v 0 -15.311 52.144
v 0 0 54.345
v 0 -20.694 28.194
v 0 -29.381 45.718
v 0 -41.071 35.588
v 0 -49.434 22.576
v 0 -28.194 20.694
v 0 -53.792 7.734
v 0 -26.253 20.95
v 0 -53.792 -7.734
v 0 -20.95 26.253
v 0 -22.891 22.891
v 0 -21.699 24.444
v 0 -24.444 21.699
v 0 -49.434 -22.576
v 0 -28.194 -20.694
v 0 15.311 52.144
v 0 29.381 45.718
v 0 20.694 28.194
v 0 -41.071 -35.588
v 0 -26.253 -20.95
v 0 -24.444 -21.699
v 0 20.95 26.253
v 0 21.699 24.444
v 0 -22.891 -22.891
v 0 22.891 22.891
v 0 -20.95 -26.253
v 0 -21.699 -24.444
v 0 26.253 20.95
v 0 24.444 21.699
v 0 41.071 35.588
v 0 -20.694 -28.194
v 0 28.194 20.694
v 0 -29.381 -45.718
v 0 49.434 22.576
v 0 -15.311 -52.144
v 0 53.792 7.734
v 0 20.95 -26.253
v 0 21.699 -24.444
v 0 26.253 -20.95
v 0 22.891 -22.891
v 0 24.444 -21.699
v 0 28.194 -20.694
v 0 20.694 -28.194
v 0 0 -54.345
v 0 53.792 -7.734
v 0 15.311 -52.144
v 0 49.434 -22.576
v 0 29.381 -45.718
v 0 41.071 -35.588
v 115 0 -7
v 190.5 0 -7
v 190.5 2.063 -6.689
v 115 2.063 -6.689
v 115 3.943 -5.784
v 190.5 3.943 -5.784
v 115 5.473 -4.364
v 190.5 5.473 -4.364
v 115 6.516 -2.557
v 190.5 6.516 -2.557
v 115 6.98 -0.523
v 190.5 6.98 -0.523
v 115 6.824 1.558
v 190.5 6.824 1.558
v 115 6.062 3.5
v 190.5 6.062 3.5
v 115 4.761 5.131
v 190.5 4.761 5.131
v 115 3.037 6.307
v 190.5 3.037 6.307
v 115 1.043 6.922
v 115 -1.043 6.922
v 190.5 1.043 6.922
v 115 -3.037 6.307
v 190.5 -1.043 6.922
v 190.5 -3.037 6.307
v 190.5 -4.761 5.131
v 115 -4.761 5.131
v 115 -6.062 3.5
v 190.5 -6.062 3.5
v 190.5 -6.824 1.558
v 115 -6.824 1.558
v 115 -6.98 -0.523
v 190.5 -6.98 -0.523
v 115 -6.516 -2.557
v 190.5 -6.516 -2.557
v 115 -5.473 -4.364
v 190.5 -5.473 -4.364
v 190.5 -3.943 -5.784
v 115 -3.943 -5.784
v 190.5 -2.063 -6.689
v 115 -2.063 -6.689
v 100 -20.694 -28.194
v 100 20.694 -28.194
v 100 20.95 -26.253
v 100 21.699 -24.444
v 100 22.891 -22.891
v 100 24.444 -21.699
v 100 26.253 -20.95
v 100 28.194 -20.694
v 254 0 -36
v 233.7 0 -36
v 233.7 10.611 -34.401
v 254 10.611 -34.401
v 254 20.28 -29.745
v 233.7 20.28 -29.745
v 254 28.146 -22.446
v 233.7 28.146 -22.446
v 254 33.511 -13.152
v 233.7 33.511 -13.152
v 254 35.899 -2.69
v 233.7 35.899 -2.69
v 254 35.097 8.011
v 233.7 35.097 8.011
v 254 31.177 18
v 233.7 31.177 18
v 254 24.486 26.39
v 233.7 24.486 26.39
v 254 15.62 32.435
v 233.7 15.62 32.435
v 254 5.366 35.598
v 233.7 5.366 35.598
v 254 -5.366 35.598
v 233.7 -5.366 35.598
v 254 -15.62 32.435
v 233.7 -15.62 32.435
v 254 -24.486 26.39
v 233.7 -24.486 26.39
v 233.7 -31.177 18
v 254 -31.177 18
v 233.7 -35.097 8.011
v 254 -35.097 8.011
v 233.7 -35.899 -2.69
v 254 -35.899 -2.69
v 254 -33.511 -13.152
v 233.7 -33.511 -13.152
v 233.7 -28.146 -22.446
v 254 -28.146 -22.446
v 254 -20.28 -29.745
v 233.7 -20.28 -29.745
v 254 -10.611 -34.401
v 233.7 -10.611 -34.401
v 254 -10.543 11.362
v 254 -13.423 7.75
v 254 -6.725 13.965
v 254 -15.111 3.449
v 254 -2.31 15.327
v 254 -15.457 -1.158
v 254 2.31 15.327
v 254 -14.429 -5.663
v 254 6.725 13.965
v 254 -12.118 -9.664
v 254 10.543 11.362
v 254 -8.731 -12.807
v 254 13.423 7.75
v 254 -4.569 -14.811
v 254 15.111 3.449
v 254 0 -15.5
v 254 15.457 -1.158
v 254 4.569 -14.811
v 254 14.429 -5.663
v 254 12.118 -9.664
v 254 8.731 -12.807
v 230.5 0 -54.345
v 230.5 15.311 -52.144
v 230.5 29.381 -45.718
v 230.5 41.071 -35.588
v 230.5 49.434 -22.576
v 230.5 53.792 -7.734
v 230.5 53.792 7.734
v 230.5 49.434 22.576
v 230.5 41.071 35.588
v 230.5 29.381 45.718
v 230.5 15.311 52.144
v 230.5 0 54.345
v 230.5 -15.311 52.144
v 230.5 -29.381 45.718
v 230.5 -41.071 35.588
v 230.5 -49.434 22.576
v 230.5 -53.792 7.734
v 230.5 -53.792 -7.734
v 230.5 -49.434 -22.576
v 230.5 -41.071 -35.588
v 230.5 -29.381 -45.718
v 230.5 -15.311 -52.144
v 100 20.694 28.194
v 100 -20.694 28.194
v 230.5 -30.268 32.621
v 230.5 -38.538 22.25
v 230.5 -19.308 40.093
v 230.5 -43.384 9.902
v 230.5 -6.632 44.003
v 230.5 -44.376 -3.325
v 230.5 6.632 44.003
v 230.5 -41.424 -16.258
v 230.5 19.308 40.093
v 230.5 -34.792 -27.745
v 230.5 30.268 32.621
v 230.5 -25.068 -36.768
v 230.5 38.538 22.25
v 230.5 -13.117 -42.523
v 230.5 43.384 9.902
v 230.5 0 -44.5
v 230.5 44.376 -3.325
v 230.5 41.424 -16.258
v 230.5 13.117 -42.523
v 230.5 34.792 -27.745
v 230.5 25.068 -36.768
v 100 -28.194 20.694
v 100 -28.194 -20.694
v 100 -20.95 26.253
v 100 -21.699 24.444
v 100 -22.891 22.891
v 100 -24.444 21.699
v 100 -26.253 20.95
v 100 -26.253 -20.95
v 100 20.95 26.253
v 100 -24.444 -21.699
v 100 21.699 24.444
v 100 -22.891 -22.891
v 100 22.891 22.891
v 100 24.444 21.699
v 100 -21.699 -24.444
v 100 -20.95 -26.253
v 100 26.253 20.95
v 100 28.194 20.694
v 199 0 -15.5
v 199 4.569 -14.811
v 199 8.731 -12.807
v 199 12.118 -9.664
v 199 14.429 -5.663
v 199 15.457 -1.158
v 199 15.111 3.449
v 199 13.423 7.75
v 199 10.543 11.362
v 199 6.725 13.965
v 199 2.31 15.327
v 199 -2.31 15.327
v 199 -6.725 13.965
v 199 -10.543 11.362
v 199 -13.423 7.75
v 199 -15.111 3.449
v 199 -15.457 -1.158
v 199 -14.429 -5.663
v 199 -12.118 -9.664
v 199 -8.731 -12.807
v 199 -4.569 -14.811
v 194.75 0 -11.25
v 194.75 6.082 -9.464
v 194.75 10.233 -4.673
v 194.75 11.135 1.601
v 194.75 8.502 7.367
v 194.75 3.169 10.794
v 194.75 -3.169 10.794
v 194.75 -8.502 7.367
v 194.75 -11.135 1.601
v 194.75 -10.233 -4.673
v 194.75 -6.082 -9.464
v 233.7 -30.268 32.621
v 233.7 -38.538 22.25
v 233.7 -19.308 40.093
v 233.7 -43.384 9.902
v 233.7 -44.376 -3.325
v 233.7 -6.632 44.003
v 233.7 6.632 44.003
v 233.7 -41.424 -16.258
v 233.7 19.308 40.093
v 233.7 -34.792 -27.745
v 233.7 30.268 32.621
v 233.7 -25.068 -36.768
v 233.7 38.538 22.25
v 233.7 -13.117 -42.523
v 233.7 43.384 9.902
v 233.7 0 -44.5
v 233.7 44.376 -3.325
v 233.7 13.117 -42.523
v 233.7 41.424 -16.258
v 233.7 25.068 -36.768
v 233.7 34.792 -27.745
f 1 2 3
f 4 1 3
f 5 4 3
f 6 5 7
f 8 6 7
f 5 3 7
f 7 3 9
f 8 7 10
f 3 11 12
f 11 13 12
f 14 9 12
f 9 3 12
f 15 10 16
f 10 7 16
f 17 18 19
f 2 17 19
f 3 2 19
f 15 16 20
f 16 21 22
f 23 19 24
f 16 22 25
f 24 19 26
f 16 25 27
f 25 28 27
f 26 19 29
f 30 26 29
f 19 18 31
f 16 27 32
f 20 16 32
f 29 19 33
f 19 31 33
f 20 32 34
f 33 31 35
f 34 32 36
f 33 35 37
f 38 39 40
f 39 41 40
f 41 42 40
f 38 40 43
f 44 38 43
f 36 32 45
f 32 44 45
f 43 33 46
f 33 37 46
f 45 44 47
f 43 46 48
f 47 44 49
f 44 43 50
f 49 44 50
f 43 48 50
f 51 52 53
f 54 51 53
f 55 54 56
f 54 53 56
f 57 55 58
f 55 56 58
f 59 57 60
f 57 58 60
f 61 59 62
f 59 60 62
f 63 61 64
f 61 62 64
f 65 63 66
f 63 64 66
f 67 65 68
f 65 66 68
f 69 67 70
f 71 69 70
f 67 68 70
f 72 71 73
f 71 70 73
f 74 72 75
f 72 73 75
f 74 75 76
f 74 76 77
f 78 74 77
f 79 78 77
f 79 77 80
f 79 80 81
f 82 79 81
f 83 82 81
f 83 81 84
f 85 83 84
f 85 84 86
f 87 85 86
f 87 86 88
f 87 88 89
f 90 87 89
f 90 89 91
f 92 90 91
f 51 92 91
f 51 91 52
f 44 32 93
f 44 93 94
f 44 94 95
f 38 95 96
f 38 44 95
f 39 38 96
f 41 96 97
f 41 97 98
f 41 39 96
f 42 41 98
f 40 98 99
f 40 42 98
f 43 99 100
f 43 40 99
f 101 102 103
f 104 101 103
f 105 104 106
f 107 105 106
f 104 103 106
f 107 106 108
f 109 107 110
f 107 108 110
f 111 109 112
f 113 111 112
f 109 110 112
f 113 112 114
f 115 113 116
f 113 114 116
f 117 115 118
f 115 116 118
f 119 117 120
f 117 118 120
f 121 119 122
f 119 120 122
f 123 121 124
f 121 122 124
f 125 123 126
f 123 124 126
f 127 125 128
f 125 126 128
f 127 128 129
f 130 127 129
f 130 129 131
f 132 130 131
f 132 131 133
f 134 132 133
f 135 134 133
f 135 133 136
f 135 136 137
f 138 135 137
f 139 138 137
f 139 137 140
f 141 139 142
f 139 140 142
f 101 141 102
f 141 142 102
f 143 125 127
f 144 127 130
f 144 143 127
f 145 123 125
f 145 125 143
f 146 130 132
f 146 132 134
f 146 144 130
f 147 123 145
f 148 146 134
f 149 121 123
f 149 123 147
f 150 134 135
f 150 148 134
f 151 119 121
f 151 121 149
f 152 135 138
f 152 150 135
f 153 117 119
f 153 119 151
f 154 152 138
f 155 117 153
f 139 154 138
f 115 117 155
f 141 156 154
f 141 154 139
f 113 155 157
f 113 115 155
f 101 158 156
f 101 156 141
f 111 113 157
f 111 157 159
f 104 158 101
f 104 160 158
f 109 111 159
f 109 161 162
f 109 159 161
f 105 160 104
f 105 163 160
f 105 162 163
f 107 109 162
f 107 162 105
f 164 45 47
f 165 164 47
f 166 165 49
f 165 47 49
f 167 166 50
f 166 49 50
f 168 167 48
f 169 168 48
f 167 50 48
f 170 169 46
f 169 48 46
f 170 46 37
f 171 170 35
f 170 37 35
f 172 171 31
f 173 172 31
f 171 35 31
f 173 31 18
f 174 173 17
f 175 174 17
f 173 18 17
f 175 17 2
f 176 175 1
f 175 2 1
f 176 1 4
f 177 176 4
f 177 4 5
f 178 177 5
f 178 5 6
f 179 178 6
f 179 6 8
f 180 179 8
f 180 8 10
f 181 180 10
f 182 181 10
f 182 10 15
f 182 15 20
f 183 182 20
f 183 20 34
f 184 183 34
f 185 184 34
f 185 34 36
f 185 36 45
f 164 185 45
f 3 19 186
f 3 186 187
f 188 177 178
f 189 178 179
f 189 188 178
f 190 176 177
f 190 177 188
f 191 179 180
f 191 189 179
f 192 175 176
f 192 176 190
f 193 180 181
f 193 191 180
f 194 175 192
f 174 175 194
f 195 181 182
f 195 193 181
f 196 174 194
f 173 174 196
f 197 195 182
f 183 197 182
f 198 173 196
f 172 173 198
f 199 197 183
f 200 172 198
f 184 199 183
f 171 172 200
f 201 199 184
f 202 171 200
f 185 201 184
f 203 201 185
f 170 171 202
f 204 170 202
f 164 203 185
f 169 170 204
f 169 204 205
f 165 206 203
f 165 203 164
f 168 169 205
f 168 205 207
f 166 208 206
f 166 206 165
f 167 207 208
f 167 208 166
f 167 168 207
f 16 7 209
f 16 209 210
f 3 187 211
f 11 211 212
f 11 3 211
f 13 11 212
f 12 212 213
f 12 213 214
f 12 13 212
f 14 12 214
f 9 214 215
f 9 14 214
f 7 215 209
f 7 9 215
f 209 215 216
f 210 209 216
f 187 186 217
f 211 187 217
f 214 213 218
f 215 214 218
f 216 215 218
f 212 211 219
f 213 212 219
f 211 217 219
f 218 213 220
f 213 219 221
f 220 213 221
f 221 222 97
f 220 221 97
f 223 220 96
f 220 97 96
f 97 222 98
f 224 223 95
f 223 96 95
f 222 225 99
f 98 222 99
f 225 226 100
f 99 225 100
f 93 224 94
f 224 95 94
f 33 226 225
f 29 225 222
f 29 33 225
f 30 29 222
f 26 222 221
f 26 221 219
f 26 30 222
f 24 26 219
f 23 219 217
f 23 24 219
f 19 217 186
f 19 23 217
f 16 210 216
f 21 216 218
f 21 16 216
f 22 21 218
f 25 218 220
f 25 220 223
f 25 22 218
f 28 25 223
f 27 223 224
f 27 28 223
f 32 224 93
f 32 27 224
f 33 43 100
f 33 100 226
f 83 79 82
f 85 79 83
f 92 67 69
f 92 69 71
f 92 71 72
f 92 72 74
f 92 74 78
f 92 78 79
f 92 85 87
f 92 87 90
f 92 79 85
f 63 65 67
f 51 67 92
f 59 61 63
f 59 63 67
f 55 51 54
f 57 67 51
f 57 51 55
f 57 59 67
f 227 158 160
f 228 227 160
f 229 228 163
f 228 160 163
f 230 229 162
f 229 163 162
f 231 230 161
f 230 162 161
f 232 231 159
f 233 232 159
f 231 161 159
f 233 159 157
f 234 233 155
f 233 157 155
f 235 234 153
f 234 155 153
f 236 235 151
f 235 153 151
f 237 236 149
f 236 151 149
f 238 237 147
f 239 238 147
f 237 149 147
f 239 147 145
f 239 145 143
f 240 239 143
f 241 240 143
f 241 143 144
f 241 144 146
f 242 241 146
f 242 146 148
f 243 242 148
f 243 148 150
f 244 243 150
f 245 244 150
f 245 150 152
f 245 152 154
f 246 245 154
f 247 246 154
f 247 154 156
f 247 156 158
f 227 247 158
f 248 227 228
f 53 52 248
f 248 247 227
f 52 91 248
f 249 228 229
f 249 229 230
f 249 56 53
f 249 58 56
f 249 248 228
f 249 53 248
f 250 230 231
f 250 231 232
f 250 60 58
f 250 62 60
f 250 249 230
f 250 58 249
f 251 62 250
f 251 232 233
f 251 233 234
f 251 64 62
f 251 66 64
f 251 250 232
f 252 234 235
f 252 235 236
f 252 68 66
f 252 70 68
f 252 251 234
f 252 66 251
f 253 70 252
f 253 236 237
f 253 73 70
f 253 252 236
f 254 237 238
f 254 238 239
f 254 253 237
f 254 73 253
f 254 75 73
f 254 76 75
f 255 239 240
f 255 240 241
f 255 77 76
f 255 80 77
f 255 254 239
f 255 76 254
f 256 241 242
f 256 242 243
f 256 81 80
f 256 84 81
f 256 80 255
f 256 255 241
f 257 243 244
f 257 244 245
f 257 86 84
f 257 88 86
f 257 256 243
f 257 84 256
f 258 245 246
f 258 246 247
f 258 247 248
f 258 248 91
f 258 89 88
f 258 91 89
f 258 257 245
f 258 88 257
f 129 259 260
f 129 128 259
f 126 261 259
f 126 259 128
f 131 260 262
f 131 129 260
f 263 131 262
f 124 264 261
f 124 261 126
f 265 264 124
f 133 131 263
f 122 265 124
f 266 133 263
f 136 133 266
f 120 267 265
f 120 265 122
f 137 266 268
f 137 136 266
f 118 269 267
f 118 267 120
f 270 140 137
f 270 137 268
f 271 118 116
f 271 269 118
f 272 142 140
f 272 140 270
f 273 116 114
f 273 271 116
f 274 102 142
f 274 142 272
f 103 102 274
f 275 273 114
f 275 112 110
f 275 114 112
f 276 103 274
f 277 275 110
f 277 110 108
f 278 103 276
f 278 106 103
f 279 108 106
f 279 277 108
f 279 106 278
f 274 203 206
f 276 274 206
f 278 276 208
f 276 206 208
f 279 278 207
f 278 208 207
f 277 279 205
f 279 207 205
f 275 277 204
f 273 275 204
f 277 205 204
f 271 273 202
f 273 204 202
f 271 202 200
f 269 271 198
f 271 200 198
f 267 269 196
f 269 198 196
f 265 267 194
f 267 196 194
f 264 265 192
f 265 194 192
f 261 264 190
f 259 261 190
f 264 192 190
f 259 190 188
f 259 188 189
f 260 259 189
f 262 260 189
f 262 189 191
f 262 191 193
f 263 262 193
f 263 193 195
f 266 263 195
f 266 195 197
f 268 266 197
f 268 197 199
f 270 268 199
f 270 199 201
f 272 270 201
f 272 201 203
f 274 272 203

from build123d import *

# Parameters (mm, degrees)
SKETCH1_R           = 54.345
BOSS_EXTRUDE1_DEPTH = 254
CUT_EXTRUDE1_DEPTH  = 100
SKETCH3_R           = 7
CUT_EXTRUDE2_DEPTH  = 139
SKETCH3_4_R         = 15.5
SKETCH3_4_R_2       = 7
CUT_EXTRUDE3_DEPTH  = 65
CUT_EXTRUDE4_START  = -23.5
SKETCH3_6_R         = 54.345
SKETCH3_6_R_2       = 44.5
CUT_EXTRUDE4_DEPTH  = 23.5
CUT_EXTRUDE5_START  = -20.3
SKETCH3_7_R         = 44.5
SKETCH3_7_R_2       = 36
CUT_EXTRUDE5_DEPTH  = 20.3
CHAMFER1_SIZE       = 10


with BuildPart() as part:
    # Sketch1 → Boss-Extrude1 (new body)
    with BuildSketch(Plane(origin=(0, 0, 0), x_dir=(0, 0, -1), z_dir=(1, 0, 0))):
        Circle(SKETCH1_R)
    extrude(amount=BOSS_EXTRUDE1_DEPTH)

    # Sketch2 → Cut-Extrude1 (cut)
    with BuildSketch(Plane(origin=(0, 0, 0), x_dir=(0, 0, -1), z_dir=(1, 0, 0))):
        with BuildLine():
            Line((20.694, 28.194), (-20.694, 28.194))
            ThreePointArc((-20.694, 28.194), (-22.890699141, 22.890699141), (-28.194, 20.694))
            Line((-28.194, 20.694), (-28.194, -20.694))
            ThreePointArc((-28.194, -20.694), (-22.890699141, -22.890699141), (-20.694, -28.194))
            Line((-20.694, -28.194), (20.694, -28.194))
            ThreePointArc((20.694, -28.194), (22.890699141, -22.890699141), (28.194, -20.694))
            Line((28.194, -20.694), (28.194, 20.694))
            ThreePointArc((28.194, 20.694), (22.890699141, 22.890699141), (20.694, 28.194))
        make_face()
    extrude(amount=CUT_EXTRUDE1_DEPTH, mode=Mode.SUBTRACT)

    # Sketch3 → Cut-Extrude2 (cut)
    with BuildSketch(Plane(origin=(254, 0, 0), x_dir=(0, 0, -1), z_dir=(1, 0, 0))):
        Circle(SKETCH3_R)
    extrude(amount=-CUT_EXTRUDE2_DEPTH, mode=Mode.SUBTRACT)

    # Sketch3<4> → Cut-Extrude3 (cut)
    with BuildSketch(Plane(origin=(254, 0, 0), x_dir=(0, 0, -1), z_dir=(1, 0, 0))):
        Circle(SKETCH3_4_R)
        Circle(SKETCH3_4_R_2, mode=Mode.SUBTRACT)
    extrude(amount=-CUT_EXTRUDE3_DEPTH, mode=Mode.SUBTRACT)

    # Sketch3<6> → Cut-Extrude4 (cut)
    with BuildSketch(Plane(origin=(254, 0, 0), x_dir=(0, 0, -1), z_dir=(1, 0, 0)).offset(CUT_EXTRUDE4_START)):
        Circle(SKETCH3_6_R)
        Circle(SKETCH3_6_R_2, mode=Mode.SUBTRACT)
    extrude(amount=CUT_EXTRUDE4_DEPTH, mode=Mode.SUBTRACT)

    # Sketch3<7> → Cut-Extrude5 (cut)
    with BuildSketch(Plane(origin=(254, 0, 0), x_dir=(0, 0, -1), z_dir=(1, 0, 0)).offset(CUT_EXTRUDE5_START)):
        Circle(SKETCH3_7_R)
        Circle(SKETCH3_7_R_2, mode=Mode.SUBTRACT)
    extrude(amount=CUT_EXTRUDE5_DEPTH, mode=Mode.SUBTRACT)

    # Chamfer1
    # the kernel refuses this chamfer: 10 mm, written as the material it adds along each edge
    with BuildSketch(Plane(origin=(189, 0, 0), x_dir=(0, 0, -1), z_dir=(0, -1, 0))) as chamfer1_piece_1_section:
        Polygon((15.5, CHAMFER1_SIZE), (15.5 - CHAMFER1_SIZE, 0), (15.5, 0), align=None)
    chamfer1_piece_1 = revolve(axis=Axis((189, 0, 0), (1, 0, 0)), mode=Mode.PRIVATE)
    chamfer1_piece_1 = chamfer1_piece_1 - Plane(origin=(194.777828899, 0, 0), x_dir=(0, 0, -1), z_dir=(1, 0, 0)) * Cylinder(7, 62, mode=Mode.PRIVATE)
    add(chamfer1_piece_1)


solid = part.part
